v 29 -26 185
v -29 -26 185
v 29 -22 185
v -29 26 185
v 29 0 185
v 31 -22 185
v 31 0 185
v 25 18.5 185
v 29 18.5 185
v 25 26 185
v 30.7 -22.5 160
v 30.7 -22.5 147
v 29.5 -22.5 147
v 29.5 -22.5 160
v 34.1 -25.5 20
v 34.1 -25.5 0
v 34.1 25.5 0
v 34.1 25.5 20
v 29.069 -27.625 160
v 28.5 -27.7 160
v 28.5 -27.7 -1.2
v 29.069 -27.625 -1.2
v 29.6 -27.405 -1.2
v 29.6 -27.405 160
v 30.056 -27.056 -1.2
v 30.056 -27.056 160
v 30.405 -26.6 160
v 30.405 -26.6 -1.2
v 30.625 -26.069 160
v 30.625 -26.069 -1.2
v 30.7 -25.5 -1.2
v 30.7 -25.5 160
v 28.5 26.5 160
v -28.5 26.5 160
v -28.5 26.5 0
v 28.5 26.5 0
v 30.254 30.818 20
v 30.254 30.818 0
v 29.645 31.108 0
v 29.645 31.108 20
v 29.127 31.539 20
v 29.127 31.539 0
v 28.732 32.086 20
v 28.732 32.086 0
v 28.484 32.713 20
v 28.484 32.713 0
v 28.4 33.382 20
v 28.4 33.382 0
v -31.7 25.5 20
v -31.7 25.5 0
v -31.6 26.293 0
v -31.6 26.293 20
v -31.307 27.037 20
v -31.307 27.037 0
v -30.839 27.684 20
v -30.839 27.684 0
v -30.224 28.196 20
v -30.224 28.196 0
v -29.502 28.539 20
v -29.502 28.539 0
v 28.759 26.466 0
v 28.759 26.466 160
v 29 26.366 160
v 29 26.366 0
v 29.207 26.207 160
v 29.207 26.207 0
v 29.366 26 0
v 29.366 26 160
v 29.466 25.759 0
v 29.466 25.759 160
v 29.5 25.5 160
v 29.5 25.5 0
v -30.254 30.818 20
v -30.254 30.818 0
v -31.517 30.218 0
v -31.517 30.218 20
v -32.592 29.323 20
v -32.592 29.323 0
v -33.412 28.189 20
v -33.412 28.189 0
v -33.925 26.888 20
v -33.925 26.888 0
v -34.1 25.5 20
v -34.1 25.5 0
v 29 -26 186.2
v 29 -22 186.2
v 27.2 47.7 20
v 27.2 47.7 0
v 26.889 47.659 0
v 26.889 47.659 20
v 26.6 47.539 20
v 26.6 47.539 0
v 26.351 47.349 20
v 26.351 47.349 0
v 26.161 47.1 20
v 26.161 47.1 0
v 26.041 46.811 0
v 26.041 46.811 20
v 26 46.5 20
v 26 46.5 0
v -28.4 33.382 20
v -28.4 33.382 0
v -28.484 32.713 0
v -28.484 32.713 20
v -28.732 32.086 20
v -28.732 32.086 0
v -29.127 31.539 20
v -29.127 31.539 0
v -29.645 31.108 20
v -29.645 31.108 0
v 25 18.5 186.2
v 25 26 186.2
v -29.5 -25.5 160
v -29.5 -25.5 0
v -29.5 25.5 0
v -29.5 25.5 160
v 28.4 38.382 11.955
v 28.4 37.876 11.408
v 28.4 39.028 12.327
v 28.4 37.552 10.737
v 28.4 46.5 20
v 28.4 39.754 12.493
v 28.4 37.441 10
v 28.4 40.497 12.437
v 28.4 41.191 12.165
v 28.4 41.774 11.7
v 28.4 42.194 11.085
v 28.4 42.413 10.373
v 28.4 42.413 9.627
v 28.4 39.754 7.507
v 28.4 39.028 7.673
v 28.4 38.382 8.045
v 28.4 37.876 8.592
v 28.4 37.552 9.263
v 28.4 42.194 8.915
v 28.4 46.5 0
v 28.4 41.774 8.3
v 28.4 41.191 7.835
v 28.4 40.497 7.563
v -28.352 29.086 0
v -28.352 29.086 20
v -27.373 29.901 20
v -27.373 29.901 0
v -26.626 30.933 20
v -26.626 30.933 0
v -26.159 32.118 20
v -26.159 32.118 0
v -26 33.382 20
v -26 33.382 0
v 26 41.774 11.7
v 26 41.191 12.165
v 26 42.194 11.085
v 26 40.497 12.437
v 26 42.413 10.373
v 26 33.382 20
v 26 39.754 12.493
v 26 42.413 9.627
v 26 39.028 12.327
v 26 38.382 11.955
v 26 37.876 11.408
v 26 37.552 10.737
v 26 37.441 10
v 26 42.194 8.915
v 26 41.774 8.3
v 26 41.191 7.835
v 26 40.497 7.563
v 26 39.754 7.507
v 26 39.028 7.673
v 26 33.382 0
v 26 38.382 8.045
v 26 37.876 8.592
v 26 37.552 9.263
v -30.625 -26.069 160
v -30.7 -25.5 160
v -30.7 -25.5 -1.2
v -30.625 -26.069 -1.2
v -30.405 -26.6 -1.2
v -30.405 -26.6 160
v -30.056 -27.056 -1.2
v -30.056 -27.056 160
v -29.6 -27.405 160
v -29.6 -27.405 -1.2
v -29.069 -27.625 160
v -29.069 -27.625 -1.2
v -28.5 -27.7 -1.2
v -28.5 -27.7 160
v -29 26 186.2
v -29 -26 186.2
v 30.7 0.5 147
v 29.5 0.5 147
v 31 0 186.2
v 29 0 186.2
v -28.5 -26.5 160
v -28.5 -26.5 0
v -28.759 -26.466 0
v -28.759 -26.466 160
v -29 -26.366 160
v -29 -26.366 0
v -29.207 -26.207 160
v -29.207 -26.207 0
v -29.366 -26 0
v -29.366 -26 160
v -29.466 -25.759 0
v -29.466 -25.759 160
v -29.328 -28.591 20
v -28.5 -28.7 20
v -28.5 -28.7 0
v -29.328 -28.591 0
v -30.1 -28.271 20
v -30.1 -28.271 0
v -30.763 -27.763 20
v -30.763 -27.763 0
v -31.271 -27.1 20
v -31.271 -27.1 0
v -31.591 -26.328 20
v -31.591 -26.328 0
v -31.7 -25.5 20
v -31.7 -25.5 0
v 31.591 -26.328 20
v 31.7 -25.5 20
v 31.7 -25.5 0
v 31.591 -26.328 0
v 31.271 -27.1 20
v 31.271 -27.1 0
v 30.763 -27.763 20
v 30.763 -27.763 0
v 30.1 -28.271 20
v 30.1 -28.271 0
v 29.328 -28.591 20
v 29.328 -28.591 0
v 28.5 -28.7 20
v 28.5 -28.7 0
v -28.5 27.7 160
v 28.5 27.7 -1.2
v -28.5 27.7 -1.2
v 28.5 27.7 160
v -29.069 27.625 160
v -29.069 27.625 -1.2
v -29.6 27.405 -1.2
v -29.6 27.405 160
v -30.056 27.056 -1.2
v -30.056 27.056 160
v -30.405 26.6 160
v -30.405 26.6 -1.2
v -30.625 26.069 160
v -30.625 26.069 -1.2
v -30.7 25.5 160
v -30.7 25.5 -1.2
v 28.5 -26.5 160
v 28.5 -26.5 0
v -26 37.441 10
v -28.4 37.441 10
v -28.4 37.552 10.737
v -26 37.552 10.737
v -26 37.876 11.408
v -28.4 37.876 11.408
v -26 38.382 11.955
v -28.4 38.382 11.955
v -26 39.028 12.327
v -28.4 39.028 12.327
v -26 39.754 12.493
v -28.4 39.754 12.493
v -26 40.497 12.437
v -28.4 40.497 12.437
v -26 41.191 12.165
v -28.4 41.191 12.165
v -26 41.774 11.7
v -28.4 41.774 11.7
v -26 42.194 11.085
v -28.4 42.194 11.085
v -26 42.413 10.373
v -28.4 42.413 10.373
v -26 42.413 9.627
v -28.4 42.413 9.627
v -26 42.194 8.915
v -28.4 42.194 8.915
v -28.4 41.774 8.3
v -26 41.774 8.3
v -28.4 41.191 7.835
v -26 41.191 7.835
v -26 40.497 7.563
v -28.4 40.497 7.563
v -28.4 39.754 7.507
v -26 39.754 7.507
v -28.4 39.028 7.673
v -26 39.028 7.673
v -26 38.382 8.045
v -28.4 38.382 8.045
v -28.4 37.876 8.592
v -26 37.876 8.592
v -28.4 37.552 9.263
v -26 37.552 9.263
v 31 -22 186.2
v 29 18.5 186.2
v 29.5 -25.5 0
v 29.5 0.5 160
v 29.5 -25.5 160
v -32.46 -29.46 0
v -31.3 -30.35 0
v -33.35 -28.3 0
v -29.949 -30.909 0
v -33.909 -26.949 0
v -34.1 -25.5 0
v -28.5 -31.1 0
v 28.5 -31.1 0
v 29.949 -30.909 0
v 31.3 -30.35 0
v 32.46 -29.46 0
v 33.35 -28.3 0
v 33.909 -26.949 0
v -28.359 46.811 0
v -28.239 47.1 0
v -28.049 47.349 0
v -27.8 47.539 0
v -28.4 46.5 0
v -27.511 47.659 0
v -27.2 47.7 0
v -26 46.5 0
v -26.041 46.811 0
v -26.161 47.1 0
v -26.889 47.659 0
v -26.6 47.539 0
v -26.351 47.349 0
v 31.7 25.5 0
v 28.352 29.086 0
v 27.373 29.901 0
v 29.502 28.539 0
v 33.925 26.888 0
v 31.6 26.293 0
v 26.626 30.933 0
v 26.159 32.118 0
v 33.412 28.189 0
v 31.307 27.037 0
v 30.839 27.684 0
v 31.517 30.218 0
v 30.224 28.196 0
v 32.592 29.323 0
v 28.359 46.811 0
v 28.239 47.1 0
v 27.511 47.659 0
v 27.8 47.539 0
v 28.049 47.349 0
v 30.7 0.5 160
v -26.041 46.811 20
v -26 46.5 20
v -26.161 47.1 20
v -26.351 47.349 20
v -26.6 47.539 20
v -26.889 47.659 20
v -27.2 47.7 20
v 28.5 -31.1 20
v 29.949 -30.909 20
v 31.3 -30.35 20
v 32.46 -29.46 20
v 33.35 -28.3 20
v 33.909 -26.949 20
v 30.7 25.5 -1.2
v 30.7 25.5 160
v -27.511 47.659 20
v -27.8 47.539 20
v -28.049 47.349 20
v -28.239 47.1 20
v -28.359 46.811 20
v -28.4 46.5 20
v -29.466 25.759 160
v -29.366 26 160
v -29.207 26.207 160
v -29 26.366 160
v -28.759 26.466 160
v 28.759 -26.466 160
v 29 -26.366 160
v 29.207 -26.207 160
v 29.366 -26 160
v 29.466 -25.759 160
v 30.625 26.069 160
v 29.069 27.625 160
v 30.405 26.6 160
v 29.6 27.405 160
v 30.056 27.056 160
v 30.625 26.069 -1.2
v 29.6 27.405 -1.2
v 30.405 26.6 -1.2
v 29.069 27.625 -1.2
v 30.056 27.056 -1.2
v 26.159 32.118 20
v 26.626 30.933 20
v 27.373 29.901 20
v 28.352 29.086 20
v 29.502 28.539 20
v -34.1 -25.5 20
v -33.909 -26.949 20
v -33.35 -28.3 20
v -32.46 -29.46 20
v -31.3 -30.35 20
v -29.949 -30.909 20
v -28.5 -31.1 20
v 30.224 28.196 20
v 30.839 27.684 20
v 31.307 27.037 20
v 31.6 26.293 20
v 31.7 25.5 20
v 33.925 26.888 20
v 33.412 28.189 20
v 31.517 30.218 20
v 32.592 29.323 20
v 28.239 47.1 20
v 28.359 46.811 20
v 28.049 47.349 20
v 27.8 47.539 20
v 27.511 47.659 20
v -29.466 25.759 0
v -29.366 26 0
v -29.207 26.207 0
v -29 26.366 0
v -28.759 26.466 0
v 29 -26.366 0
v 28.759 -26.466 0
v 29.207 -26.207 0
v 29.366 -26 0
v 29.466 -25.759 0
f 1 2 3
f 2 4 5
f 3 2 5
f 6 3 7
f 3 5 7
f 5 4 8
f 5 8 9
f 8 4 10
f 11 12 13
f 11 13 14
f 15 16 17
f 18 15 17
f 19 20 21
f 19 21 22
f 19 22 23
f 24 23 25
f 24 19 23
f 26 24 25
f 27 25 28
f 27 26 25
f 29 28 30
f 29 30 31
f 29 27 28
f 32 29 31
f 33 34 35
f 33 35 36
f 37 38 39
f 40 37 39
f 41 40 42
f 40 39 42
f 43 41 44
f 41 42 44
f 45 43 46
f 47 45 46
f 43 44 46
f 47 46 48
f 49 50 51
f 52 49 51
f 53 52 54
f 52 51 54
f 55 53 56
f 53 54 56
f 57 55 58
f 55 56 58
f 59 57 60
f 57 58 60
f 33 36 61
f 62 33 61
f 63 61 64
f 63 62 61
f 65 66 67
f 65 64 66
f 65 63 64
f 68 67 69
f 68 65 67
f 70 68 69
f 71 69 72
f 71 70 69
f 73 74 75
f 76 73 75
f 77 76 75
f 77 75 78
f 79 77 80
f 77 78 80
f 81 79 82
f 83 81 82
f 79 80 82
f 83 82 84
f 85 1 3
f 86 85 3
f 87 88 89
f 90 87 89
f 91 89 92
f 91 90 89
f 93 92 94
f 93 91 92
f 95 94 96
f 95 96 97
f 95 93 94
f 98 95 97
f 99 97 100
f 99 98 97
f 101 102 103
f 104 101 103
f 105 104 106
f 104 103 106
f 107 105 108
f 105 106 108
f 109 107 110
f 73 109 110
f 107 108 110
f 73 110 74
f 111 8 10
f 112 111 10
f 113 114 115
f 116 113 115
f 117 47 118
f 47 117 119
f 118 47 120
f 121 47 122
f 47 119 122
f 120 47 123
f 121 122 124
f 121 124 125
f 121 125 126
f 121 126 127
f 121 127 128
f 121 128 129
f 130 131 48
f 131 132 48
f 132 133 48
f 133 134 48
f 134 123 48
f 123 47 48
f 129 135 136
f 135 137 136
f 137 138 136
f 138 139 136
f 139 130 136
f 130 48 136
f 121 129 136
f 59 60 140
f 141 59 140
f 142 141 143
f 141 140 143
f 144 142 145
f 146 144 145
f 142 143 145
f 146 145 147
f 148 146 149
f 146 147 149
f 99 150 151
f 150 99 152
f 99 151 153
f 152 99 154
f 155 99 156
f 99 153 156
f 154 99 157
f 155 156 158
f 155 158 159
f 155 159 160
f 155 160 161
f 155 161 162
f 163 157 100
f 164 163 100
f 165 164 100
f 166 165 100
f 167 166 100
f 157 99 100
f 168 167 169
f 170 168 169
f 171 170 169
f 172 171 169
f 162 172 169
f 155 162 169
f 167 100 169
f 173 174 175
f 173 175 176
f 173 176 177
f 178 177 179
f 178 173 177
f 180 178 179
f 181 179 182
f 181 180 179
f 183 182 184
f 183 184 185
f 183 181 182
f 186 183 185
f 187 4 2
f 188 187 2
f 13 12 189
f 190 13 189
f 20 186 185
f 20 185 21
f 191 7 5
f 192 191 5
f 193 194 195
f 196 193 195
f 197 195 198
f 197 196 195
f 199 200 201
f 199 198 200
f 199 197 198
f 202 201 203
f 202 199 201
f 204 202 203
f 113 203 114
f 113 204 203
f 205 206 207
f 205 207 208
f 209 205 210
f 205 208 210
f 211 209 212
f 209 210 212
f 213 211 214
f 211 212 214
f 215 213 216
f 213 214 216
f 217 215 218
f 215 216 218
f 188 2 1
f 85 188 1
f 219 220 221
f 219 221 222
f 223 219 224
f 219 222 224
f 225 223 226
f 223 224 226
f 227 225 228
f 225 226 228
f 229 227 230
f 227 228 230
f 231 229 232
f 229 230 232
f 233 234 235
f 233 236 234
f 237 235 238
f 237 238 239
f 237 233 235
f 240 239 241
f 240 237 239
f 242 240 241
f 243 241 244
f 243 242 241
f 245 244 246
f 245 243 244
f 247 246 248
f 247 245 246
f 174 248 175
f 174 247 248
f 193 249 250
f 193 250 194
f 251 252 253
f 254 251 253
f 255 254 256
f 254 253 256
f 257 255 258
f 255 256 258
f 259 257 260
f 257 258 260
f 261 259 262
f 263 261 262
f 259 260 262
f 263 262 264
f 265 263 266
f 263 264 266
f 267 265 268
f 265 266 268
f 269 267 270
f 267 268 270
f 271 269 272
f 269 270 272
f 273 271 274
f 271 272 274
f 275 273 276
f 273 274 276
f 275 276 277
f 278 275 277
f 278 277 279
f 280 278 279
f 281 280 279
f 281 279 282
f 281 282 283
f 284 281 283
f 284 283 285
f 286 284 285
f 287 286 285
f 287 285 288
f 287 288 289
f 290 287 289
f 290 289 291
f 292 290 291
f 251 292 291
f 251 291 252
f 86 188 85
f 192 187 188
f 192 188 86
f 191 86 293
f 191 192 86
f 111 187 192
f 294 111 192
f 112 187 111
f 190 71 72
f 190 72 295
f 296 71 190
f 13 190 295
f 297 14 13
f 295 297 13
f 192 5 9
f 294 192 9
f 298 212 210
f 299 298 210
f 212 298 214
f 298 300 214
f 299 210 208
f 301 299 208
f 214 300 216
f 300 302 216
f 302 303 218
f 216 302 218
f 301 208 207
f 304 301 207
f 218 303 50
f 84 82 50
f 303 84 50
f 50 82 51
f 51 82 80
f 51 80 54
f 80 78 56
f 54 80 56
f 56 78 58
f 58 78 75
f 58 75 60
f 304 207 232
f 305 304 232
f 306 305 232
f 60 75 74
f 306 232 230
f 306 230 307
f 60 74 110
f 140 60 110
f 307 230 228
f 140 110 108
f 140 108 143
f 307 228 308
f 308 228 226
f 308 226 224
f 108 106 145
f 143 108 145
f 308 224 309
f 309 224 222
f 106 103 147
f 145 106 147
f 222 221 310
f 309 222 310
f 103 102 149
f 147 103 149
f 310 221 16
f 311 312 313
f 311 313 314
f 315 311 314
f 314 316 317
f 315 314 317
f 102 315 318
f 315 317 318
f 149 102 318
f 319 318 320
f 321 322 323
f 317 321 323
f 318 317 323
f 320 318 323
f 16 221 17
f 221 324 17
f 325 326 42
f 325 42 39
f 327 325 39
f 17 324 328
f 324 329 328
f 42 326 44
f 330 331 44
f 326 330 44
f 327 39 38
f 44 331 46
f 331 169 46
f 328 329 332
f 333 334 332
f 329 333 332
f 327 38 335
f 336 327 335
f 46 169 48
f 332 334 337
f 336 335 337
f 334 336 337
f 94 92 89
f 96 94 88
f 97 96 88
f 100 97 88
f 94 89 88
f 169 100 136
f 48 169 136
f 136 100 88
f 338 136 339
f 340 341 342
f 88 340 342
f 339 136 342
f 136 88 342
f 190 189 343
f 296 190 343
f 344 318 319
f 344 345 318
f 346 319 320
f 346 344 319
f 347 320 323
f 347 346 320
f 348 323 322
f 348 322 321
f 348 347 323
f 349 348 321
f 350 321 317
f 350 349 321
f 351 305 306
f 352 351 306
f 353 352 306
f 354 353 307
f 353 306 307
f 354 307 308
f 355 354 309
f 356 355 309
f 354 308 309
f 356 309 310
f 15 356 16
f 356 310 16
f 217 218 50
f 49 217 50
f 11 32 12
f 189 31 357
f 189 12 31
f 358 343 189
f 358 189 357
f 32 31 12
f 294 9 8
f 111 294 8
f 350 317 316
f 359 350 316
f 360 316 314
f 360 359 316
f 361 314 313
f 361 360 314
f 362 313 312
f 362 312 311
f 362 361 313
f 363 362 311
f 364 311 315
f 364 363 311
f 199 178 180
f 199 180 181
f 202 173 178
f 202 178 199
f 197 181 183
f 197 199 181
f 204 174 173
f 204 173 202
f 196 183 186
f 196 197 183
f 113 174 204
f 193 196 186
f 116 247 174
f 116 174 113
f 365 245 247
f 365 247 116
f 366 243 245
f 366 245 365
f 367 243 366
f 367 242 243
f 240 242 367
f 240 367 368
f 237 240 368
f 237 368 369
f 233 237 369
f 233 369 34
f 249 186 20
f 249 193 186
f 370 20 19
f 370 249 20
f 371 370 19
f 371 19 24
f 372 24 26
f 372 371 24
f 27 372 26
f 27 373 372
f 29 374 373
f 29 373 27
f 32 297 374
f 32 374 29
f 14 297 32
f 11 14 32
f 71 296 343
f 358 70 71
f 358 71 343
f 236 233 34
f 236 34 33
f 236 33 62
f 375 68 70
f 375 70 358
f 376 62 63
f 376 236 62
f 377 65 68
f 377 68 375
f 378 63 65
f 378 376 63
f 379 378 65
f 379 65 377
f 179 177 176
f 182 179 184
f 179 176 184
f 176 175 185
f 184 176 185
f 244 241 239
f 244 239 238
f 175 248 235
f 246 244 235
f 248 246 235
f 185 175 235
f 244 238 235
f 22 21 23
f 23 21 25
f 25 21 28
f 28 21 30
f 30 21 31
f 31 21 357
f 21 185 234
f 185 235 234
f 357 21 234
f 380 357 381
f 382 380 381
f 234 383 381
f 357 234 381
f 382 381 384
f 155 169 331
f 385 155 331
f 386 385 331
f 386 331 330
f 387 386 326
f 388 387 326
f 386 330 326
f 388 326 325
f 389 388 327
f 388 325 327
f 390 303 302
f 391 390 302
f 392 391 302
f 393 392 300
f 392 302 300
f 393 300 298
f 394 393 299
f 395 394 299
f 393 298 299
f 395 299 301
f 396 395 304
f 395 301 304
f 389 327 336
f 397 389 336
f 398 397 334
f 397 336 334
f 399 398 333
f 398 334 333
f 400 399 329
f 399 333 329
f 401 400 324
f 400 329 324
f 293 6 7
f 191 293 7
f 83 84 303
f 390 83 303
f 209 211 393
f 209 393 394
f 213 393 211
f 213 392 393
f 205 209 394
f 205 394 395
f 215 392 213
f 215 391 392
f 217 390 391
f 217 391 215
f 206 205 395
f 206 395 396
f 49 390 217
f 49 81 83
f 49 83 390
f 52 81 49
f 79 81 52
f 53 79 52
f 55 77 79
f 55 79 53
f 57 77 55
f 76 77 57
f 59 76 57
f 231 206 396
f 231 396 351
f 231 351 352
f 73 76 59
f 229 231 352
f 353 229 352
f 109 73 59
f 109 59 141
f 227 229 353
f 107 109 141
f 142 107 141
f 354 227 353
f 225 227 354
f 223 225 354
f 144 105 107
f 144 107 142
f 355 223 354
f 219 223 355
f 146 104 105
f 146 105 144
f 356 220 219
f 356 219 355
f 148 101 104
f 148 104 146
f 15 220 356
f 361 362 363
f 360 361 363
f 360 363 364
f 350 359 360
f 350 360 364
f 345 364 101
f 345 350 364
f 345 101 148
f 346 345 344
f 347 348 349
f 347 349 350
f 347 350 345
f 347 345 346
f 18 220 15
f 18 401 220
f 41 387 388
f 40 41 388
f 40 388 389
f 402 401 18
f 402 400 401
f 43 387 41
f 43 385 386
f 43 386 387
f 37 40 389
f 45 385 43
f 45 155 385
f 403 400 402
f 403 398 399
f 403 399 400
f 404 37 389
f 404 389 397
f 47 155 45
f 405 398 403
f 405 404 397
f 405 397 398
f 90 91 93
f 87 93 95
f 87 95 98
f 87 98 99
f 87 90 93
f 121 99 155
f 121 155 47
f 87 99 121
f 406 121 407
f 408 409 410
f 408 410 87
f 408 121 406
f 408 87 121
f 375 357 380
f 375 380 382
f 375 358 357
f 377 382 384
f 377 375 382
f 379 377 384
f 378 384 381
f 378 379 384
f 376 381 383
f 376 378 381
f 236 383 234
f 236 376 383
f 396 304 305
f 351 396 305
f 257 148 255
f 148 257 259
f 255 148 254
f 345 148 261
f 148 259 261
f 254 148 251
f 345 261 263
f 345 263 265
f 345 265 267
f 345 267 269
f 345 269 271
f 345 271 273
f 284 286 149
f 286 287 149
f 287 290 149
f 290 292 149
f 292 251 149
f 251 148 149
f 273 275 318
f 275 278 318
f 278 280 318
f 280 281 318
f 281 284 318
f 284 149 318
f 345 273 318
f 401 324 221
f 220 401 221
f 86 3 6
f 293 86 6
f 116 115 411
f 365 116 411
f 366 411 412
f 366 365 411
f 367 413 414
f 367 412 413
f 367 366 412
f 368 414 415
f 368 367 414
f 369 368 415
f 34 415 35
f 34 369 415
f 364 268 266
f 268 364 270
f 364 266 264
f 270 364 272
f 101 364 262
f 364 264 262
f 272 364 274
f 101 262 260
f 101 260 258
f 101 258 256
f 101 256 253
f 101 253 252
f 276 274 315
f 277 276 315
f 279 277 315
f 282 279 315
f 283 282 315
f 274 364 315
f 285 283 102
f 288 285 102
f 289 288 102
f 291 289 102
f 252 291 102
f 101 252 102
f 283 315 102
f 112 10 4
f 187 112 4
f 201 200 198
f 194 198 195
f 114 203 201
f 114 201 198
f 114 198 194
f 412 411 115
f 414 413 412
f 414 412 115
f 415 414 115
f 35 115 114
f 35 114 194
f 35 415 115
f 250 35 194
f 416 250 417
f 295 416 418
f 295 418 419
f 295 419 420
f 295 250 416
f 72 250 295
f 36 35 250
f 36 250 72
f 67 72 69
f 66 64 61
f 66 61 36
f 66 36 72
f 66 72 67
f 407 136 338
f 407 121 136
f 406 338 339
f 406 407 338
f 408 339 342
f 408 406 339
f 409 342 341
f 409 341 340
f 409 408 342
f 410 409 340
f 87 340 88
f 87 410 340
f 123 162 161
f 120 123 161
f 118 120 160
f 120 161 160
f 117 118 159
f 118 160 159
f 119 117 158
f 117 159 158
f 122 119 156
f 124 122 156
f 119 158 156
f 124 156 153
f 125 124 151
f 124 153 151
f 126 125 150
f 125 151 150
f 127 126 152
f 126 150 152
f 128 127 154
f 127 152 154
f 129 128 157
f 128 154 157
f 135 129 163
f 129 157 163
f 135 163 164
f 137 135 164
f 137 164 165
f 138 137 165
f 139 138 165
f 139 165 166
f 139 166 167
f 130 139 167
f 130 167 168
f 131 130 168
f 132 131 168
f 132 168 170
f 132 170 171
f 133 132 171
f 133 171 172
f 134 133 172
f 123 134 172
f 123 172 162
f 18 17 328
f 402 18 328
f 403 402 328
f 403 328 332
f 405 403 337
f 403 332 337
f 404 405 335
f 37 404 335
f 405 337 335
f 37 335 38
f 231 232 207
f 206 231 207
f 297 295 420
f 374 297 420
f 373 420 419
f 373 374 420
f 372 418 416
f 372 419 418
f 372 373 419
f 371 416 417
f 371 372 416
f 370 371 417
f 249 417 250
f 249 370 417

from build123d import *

# Parameters (mm, degrees)
F1_DEPTH      = 160
F1_DEPTH_BACK = 1.2
F2_DEPTH      = 1.2
F3_W          = 23
F3_H          = 13
F4_DEPTH      = 1.2
F6_W          = 0.5
F6_H          = 22
F6_W_2        = 1.5
F7_DEPTH      = 1.2
F8_DEPTH      = 20
F9_R          = 1.19999
F10_R         = 2.5
F11_DEPTH     = 62.501


# Not quite as in the source:
# - a fillet or chamfer is up to 0.001 mm smaller than in the source, because OpenCascade refuses the exact size


with BuildPart() as f1:
    # F0 (on Top) → F1 (new body, two sides)
    with BuildSketch(Plane.XY) as f1_sk:
        with BuildLine():
            Line((-30.7, 25.5), (-30.7, -25.5))
            ThreePointArc((-30.7, -25.5), (-30.0556349186, -27.0556349186), (-28.5, -27.7))
            Line((-28.5, -27.7), (28.5, -27.7))
            ThreePointArc((28.5, -27.7), (30.0556349186, -27.0556349186), (30.7, -25.5))
            Line((30.7, -25.5), (30.7, 25.5))
            ThreePointArc((30.7, 25.5), (30.0556349186, 27.0556349186), (28.5, 27.7))
            Line((28.5, 27.7), (-28.5, 27.7))
            ThreePointArc((-28.5, 27.7), (-30.0556349186, 27.0556349186), (-30.7, 25.5))
        make_face()
        with BuildLine():
            ThreePointArc((29.5, -25.5), (29.2071067812, -26.2071067812), (28.5, -26.5))
            Line((28.5, -26.5), (-28.5, -26.5))
            ThreePointArc((-28.5, -26.5), (-29.2071067812, -26.2071067812), (-29.5, -25.5))
            Line((-29.5, -25.5), (-29.5, 25.5))
            ThreePointArc((-29.5, 25.5), (-29.2071067812, 26.2071067812), (-28.5, 26.5))
            Line((-28.5, 26.5), (28.5, 26.5))
            ThreePointArc((28.5, 26.5), (29.2071067812, 26.2071067812), (29.5, 25.5))
            Line((29.5, 25.5), (29.5, -25.5))
        make_face(mode=Mode.SUBTRACT)
    extrude(amount=F1_DEPTH)
    extrude(f1_sk.sketch, amount=-F1_DEPTH_BACK)

    # F0 (on Top) → F2 (join)
    with BuildSketch(Plane.XY):
        with BuildLine():
            Line((-28.5, -26.5), (28.5, -26.5))
            ThreePointArc((28.5, -26.5), (29.2071067812, -26.2071067812), (29.5, -25.5))
            Line((29.5, -25.5), (29.5, 25.5))
            ThreePointArc((29.5, 25.5), (29.2071067812, 26.2071067812), (28.5, 26.5))
            Line((28.5, 26.5), (-28.5, 26.5))
            ThreePointArc((-28.5, 26.5), (-29.2071067812, 26.2071067812), (-29.5, 25.5))
            Line((-29.5, 25.5), (-29.5, -25.5))
            ThreePointArc((-29.5, -25.5), (-29.2071067812, -26.2071067812), (-28.5, -26.5))
        make_face()
    extrude(amount=-F2_DEPTH)

    # F3 (on face) → F4 (cut, through all)
    with BuildSketch(Plane.YZ.offset(30.7)):
        with Locations((-11, 153.5)):
            Rectangle(F3_W, F3_H)
    extrude(amount=-F4_DEPTH, mode=Mode.SUBTRACT)


with BuildPart() as f7:
    # F6 (on offset) → F7 (new body)
    with BuildSketch(Plane.XY.offset(185)):
        Polygon((29, -22), (29, 0), (29, 18.5), (25, 18.5), (25, 26), (-29, 26), (-29, -26), (29, -26), align=None)
        with Locations((29.25, -11)):
            Rectangle(F6_W, F6_H)
        with Locations((30.25, -11)):
            Rectangle(F6_W_2, F6_H)
    extrude(amount=F7_DEPTH)


with BuildPart() as f8:
    # F0 (on Top) → F8 (new body)
    with BuildSketch(Plane.XY):
        with BuildLine():
            ThreePointArc((29.5024096386, 28.5389430591), (31.0930398033, 27.3751385491), (31.7, 25.5))
            Line((31.7, 25.5), (31.7, -25.5))
            ThreePointArc((31.7, -25.5), (30.7627416998, -27.7627416998), (28.5, -28.7))
            Line((28.5, -28.7), (-28.5, -28.7))
            ThreePointArc((-28.5, -28.7), (-30.7627416998, -27.7627416998), (-31.7, -25.5))
            Line((-31.7, -25.5), (-31.7, 25.5))
            ThreePointArc((-31.7, 25.5), (-31.0930398033, 27.3751385491), (-29.5024096386, 28.5389430591))
            ThreePointArc((-29.5024096386, 28.5389430591), (-26.9673428134, 30.393756497), (-26, 33.3822585596))
            Line((-26, 33.3822585596), (-26, 47.7))
            Line((-26, 47.7), (-28.4, 47.7))
            Line((-28.4, 47.7), (-28.4, 33.3822585596))
            ThreePointArc((-28.4, 33.3822585596), (-28.9121226659, 31.8001104088), (-30.2542168675, 30.8181503534))
            ThreePointArc((-30.2542168675, 30.8181503534), (-33.0378196558, 28.7814924609), (-34.1, 25.5))
            Line((-34.1, 25.5), (-34.1, -25.5))
            ThreePointArc((-34.1, -25.5), (-32.4597979746, -29.4597979746), (-28.5, -31.1))
            Line((-28.5, -31.1), (28.5, -31.1))
            ThreePointArc((28.5, -31.1), (32.4597979746, -29.4597979746), (34.1, -25.5))
            Line((34.1, -25.5), (34.1, 25.5))
            ThreePointArc((34.1, 25.5), (33.0378196558, 28.7814924609), (30.2542168675, 30.8181503534))
            ThreePointArc((30.2542168675, 30.8181503534), (28.9121226659, 31.8001104088), (28.4, 33.3822585596))
            Line((28.4, 33.3822585596), (28.4, 47.7))
            Line((28.4, 47.7), (26, 47.7))
            Line((26, 47.7), (26, 33.3822585596))
            ThreePointArc((26, 33.3822585596), (26.9673428134, 30.393756497), (29.5024096386, 28.5389430591))
        make_face()
    extrude(amount=F8_DEPTH)

    # F9 (radius 1.2 in the source; OpenCascade refuses exactly that, so slightly less here)
    f9_edges = [f8.edges().sort_by_distance(p)[0] for p in [
        (-28.4, 47.7, 10),
        (-26, 47.7, 10),
        (28.4, 47.7, 10),
        (26, 47.7, 10),
    ]]
    fillet(f9_edges, radius=F9_R)

    # F10 (on face) → F11 (cut, through all)
    with BuildSketch(Plane(origin=(-28.4, 0, 0), x_dir=(0, -1, 0), z_dir=(-1, 0, 0))):
        with Locations((-39.9411292798, 10)):
            Circle(F10_R)
    extrude(amount=-F11_DEPTH, mode=Mode.SUBTRACT)


solid = Compound([f1.part, f7.part, f8.part])
